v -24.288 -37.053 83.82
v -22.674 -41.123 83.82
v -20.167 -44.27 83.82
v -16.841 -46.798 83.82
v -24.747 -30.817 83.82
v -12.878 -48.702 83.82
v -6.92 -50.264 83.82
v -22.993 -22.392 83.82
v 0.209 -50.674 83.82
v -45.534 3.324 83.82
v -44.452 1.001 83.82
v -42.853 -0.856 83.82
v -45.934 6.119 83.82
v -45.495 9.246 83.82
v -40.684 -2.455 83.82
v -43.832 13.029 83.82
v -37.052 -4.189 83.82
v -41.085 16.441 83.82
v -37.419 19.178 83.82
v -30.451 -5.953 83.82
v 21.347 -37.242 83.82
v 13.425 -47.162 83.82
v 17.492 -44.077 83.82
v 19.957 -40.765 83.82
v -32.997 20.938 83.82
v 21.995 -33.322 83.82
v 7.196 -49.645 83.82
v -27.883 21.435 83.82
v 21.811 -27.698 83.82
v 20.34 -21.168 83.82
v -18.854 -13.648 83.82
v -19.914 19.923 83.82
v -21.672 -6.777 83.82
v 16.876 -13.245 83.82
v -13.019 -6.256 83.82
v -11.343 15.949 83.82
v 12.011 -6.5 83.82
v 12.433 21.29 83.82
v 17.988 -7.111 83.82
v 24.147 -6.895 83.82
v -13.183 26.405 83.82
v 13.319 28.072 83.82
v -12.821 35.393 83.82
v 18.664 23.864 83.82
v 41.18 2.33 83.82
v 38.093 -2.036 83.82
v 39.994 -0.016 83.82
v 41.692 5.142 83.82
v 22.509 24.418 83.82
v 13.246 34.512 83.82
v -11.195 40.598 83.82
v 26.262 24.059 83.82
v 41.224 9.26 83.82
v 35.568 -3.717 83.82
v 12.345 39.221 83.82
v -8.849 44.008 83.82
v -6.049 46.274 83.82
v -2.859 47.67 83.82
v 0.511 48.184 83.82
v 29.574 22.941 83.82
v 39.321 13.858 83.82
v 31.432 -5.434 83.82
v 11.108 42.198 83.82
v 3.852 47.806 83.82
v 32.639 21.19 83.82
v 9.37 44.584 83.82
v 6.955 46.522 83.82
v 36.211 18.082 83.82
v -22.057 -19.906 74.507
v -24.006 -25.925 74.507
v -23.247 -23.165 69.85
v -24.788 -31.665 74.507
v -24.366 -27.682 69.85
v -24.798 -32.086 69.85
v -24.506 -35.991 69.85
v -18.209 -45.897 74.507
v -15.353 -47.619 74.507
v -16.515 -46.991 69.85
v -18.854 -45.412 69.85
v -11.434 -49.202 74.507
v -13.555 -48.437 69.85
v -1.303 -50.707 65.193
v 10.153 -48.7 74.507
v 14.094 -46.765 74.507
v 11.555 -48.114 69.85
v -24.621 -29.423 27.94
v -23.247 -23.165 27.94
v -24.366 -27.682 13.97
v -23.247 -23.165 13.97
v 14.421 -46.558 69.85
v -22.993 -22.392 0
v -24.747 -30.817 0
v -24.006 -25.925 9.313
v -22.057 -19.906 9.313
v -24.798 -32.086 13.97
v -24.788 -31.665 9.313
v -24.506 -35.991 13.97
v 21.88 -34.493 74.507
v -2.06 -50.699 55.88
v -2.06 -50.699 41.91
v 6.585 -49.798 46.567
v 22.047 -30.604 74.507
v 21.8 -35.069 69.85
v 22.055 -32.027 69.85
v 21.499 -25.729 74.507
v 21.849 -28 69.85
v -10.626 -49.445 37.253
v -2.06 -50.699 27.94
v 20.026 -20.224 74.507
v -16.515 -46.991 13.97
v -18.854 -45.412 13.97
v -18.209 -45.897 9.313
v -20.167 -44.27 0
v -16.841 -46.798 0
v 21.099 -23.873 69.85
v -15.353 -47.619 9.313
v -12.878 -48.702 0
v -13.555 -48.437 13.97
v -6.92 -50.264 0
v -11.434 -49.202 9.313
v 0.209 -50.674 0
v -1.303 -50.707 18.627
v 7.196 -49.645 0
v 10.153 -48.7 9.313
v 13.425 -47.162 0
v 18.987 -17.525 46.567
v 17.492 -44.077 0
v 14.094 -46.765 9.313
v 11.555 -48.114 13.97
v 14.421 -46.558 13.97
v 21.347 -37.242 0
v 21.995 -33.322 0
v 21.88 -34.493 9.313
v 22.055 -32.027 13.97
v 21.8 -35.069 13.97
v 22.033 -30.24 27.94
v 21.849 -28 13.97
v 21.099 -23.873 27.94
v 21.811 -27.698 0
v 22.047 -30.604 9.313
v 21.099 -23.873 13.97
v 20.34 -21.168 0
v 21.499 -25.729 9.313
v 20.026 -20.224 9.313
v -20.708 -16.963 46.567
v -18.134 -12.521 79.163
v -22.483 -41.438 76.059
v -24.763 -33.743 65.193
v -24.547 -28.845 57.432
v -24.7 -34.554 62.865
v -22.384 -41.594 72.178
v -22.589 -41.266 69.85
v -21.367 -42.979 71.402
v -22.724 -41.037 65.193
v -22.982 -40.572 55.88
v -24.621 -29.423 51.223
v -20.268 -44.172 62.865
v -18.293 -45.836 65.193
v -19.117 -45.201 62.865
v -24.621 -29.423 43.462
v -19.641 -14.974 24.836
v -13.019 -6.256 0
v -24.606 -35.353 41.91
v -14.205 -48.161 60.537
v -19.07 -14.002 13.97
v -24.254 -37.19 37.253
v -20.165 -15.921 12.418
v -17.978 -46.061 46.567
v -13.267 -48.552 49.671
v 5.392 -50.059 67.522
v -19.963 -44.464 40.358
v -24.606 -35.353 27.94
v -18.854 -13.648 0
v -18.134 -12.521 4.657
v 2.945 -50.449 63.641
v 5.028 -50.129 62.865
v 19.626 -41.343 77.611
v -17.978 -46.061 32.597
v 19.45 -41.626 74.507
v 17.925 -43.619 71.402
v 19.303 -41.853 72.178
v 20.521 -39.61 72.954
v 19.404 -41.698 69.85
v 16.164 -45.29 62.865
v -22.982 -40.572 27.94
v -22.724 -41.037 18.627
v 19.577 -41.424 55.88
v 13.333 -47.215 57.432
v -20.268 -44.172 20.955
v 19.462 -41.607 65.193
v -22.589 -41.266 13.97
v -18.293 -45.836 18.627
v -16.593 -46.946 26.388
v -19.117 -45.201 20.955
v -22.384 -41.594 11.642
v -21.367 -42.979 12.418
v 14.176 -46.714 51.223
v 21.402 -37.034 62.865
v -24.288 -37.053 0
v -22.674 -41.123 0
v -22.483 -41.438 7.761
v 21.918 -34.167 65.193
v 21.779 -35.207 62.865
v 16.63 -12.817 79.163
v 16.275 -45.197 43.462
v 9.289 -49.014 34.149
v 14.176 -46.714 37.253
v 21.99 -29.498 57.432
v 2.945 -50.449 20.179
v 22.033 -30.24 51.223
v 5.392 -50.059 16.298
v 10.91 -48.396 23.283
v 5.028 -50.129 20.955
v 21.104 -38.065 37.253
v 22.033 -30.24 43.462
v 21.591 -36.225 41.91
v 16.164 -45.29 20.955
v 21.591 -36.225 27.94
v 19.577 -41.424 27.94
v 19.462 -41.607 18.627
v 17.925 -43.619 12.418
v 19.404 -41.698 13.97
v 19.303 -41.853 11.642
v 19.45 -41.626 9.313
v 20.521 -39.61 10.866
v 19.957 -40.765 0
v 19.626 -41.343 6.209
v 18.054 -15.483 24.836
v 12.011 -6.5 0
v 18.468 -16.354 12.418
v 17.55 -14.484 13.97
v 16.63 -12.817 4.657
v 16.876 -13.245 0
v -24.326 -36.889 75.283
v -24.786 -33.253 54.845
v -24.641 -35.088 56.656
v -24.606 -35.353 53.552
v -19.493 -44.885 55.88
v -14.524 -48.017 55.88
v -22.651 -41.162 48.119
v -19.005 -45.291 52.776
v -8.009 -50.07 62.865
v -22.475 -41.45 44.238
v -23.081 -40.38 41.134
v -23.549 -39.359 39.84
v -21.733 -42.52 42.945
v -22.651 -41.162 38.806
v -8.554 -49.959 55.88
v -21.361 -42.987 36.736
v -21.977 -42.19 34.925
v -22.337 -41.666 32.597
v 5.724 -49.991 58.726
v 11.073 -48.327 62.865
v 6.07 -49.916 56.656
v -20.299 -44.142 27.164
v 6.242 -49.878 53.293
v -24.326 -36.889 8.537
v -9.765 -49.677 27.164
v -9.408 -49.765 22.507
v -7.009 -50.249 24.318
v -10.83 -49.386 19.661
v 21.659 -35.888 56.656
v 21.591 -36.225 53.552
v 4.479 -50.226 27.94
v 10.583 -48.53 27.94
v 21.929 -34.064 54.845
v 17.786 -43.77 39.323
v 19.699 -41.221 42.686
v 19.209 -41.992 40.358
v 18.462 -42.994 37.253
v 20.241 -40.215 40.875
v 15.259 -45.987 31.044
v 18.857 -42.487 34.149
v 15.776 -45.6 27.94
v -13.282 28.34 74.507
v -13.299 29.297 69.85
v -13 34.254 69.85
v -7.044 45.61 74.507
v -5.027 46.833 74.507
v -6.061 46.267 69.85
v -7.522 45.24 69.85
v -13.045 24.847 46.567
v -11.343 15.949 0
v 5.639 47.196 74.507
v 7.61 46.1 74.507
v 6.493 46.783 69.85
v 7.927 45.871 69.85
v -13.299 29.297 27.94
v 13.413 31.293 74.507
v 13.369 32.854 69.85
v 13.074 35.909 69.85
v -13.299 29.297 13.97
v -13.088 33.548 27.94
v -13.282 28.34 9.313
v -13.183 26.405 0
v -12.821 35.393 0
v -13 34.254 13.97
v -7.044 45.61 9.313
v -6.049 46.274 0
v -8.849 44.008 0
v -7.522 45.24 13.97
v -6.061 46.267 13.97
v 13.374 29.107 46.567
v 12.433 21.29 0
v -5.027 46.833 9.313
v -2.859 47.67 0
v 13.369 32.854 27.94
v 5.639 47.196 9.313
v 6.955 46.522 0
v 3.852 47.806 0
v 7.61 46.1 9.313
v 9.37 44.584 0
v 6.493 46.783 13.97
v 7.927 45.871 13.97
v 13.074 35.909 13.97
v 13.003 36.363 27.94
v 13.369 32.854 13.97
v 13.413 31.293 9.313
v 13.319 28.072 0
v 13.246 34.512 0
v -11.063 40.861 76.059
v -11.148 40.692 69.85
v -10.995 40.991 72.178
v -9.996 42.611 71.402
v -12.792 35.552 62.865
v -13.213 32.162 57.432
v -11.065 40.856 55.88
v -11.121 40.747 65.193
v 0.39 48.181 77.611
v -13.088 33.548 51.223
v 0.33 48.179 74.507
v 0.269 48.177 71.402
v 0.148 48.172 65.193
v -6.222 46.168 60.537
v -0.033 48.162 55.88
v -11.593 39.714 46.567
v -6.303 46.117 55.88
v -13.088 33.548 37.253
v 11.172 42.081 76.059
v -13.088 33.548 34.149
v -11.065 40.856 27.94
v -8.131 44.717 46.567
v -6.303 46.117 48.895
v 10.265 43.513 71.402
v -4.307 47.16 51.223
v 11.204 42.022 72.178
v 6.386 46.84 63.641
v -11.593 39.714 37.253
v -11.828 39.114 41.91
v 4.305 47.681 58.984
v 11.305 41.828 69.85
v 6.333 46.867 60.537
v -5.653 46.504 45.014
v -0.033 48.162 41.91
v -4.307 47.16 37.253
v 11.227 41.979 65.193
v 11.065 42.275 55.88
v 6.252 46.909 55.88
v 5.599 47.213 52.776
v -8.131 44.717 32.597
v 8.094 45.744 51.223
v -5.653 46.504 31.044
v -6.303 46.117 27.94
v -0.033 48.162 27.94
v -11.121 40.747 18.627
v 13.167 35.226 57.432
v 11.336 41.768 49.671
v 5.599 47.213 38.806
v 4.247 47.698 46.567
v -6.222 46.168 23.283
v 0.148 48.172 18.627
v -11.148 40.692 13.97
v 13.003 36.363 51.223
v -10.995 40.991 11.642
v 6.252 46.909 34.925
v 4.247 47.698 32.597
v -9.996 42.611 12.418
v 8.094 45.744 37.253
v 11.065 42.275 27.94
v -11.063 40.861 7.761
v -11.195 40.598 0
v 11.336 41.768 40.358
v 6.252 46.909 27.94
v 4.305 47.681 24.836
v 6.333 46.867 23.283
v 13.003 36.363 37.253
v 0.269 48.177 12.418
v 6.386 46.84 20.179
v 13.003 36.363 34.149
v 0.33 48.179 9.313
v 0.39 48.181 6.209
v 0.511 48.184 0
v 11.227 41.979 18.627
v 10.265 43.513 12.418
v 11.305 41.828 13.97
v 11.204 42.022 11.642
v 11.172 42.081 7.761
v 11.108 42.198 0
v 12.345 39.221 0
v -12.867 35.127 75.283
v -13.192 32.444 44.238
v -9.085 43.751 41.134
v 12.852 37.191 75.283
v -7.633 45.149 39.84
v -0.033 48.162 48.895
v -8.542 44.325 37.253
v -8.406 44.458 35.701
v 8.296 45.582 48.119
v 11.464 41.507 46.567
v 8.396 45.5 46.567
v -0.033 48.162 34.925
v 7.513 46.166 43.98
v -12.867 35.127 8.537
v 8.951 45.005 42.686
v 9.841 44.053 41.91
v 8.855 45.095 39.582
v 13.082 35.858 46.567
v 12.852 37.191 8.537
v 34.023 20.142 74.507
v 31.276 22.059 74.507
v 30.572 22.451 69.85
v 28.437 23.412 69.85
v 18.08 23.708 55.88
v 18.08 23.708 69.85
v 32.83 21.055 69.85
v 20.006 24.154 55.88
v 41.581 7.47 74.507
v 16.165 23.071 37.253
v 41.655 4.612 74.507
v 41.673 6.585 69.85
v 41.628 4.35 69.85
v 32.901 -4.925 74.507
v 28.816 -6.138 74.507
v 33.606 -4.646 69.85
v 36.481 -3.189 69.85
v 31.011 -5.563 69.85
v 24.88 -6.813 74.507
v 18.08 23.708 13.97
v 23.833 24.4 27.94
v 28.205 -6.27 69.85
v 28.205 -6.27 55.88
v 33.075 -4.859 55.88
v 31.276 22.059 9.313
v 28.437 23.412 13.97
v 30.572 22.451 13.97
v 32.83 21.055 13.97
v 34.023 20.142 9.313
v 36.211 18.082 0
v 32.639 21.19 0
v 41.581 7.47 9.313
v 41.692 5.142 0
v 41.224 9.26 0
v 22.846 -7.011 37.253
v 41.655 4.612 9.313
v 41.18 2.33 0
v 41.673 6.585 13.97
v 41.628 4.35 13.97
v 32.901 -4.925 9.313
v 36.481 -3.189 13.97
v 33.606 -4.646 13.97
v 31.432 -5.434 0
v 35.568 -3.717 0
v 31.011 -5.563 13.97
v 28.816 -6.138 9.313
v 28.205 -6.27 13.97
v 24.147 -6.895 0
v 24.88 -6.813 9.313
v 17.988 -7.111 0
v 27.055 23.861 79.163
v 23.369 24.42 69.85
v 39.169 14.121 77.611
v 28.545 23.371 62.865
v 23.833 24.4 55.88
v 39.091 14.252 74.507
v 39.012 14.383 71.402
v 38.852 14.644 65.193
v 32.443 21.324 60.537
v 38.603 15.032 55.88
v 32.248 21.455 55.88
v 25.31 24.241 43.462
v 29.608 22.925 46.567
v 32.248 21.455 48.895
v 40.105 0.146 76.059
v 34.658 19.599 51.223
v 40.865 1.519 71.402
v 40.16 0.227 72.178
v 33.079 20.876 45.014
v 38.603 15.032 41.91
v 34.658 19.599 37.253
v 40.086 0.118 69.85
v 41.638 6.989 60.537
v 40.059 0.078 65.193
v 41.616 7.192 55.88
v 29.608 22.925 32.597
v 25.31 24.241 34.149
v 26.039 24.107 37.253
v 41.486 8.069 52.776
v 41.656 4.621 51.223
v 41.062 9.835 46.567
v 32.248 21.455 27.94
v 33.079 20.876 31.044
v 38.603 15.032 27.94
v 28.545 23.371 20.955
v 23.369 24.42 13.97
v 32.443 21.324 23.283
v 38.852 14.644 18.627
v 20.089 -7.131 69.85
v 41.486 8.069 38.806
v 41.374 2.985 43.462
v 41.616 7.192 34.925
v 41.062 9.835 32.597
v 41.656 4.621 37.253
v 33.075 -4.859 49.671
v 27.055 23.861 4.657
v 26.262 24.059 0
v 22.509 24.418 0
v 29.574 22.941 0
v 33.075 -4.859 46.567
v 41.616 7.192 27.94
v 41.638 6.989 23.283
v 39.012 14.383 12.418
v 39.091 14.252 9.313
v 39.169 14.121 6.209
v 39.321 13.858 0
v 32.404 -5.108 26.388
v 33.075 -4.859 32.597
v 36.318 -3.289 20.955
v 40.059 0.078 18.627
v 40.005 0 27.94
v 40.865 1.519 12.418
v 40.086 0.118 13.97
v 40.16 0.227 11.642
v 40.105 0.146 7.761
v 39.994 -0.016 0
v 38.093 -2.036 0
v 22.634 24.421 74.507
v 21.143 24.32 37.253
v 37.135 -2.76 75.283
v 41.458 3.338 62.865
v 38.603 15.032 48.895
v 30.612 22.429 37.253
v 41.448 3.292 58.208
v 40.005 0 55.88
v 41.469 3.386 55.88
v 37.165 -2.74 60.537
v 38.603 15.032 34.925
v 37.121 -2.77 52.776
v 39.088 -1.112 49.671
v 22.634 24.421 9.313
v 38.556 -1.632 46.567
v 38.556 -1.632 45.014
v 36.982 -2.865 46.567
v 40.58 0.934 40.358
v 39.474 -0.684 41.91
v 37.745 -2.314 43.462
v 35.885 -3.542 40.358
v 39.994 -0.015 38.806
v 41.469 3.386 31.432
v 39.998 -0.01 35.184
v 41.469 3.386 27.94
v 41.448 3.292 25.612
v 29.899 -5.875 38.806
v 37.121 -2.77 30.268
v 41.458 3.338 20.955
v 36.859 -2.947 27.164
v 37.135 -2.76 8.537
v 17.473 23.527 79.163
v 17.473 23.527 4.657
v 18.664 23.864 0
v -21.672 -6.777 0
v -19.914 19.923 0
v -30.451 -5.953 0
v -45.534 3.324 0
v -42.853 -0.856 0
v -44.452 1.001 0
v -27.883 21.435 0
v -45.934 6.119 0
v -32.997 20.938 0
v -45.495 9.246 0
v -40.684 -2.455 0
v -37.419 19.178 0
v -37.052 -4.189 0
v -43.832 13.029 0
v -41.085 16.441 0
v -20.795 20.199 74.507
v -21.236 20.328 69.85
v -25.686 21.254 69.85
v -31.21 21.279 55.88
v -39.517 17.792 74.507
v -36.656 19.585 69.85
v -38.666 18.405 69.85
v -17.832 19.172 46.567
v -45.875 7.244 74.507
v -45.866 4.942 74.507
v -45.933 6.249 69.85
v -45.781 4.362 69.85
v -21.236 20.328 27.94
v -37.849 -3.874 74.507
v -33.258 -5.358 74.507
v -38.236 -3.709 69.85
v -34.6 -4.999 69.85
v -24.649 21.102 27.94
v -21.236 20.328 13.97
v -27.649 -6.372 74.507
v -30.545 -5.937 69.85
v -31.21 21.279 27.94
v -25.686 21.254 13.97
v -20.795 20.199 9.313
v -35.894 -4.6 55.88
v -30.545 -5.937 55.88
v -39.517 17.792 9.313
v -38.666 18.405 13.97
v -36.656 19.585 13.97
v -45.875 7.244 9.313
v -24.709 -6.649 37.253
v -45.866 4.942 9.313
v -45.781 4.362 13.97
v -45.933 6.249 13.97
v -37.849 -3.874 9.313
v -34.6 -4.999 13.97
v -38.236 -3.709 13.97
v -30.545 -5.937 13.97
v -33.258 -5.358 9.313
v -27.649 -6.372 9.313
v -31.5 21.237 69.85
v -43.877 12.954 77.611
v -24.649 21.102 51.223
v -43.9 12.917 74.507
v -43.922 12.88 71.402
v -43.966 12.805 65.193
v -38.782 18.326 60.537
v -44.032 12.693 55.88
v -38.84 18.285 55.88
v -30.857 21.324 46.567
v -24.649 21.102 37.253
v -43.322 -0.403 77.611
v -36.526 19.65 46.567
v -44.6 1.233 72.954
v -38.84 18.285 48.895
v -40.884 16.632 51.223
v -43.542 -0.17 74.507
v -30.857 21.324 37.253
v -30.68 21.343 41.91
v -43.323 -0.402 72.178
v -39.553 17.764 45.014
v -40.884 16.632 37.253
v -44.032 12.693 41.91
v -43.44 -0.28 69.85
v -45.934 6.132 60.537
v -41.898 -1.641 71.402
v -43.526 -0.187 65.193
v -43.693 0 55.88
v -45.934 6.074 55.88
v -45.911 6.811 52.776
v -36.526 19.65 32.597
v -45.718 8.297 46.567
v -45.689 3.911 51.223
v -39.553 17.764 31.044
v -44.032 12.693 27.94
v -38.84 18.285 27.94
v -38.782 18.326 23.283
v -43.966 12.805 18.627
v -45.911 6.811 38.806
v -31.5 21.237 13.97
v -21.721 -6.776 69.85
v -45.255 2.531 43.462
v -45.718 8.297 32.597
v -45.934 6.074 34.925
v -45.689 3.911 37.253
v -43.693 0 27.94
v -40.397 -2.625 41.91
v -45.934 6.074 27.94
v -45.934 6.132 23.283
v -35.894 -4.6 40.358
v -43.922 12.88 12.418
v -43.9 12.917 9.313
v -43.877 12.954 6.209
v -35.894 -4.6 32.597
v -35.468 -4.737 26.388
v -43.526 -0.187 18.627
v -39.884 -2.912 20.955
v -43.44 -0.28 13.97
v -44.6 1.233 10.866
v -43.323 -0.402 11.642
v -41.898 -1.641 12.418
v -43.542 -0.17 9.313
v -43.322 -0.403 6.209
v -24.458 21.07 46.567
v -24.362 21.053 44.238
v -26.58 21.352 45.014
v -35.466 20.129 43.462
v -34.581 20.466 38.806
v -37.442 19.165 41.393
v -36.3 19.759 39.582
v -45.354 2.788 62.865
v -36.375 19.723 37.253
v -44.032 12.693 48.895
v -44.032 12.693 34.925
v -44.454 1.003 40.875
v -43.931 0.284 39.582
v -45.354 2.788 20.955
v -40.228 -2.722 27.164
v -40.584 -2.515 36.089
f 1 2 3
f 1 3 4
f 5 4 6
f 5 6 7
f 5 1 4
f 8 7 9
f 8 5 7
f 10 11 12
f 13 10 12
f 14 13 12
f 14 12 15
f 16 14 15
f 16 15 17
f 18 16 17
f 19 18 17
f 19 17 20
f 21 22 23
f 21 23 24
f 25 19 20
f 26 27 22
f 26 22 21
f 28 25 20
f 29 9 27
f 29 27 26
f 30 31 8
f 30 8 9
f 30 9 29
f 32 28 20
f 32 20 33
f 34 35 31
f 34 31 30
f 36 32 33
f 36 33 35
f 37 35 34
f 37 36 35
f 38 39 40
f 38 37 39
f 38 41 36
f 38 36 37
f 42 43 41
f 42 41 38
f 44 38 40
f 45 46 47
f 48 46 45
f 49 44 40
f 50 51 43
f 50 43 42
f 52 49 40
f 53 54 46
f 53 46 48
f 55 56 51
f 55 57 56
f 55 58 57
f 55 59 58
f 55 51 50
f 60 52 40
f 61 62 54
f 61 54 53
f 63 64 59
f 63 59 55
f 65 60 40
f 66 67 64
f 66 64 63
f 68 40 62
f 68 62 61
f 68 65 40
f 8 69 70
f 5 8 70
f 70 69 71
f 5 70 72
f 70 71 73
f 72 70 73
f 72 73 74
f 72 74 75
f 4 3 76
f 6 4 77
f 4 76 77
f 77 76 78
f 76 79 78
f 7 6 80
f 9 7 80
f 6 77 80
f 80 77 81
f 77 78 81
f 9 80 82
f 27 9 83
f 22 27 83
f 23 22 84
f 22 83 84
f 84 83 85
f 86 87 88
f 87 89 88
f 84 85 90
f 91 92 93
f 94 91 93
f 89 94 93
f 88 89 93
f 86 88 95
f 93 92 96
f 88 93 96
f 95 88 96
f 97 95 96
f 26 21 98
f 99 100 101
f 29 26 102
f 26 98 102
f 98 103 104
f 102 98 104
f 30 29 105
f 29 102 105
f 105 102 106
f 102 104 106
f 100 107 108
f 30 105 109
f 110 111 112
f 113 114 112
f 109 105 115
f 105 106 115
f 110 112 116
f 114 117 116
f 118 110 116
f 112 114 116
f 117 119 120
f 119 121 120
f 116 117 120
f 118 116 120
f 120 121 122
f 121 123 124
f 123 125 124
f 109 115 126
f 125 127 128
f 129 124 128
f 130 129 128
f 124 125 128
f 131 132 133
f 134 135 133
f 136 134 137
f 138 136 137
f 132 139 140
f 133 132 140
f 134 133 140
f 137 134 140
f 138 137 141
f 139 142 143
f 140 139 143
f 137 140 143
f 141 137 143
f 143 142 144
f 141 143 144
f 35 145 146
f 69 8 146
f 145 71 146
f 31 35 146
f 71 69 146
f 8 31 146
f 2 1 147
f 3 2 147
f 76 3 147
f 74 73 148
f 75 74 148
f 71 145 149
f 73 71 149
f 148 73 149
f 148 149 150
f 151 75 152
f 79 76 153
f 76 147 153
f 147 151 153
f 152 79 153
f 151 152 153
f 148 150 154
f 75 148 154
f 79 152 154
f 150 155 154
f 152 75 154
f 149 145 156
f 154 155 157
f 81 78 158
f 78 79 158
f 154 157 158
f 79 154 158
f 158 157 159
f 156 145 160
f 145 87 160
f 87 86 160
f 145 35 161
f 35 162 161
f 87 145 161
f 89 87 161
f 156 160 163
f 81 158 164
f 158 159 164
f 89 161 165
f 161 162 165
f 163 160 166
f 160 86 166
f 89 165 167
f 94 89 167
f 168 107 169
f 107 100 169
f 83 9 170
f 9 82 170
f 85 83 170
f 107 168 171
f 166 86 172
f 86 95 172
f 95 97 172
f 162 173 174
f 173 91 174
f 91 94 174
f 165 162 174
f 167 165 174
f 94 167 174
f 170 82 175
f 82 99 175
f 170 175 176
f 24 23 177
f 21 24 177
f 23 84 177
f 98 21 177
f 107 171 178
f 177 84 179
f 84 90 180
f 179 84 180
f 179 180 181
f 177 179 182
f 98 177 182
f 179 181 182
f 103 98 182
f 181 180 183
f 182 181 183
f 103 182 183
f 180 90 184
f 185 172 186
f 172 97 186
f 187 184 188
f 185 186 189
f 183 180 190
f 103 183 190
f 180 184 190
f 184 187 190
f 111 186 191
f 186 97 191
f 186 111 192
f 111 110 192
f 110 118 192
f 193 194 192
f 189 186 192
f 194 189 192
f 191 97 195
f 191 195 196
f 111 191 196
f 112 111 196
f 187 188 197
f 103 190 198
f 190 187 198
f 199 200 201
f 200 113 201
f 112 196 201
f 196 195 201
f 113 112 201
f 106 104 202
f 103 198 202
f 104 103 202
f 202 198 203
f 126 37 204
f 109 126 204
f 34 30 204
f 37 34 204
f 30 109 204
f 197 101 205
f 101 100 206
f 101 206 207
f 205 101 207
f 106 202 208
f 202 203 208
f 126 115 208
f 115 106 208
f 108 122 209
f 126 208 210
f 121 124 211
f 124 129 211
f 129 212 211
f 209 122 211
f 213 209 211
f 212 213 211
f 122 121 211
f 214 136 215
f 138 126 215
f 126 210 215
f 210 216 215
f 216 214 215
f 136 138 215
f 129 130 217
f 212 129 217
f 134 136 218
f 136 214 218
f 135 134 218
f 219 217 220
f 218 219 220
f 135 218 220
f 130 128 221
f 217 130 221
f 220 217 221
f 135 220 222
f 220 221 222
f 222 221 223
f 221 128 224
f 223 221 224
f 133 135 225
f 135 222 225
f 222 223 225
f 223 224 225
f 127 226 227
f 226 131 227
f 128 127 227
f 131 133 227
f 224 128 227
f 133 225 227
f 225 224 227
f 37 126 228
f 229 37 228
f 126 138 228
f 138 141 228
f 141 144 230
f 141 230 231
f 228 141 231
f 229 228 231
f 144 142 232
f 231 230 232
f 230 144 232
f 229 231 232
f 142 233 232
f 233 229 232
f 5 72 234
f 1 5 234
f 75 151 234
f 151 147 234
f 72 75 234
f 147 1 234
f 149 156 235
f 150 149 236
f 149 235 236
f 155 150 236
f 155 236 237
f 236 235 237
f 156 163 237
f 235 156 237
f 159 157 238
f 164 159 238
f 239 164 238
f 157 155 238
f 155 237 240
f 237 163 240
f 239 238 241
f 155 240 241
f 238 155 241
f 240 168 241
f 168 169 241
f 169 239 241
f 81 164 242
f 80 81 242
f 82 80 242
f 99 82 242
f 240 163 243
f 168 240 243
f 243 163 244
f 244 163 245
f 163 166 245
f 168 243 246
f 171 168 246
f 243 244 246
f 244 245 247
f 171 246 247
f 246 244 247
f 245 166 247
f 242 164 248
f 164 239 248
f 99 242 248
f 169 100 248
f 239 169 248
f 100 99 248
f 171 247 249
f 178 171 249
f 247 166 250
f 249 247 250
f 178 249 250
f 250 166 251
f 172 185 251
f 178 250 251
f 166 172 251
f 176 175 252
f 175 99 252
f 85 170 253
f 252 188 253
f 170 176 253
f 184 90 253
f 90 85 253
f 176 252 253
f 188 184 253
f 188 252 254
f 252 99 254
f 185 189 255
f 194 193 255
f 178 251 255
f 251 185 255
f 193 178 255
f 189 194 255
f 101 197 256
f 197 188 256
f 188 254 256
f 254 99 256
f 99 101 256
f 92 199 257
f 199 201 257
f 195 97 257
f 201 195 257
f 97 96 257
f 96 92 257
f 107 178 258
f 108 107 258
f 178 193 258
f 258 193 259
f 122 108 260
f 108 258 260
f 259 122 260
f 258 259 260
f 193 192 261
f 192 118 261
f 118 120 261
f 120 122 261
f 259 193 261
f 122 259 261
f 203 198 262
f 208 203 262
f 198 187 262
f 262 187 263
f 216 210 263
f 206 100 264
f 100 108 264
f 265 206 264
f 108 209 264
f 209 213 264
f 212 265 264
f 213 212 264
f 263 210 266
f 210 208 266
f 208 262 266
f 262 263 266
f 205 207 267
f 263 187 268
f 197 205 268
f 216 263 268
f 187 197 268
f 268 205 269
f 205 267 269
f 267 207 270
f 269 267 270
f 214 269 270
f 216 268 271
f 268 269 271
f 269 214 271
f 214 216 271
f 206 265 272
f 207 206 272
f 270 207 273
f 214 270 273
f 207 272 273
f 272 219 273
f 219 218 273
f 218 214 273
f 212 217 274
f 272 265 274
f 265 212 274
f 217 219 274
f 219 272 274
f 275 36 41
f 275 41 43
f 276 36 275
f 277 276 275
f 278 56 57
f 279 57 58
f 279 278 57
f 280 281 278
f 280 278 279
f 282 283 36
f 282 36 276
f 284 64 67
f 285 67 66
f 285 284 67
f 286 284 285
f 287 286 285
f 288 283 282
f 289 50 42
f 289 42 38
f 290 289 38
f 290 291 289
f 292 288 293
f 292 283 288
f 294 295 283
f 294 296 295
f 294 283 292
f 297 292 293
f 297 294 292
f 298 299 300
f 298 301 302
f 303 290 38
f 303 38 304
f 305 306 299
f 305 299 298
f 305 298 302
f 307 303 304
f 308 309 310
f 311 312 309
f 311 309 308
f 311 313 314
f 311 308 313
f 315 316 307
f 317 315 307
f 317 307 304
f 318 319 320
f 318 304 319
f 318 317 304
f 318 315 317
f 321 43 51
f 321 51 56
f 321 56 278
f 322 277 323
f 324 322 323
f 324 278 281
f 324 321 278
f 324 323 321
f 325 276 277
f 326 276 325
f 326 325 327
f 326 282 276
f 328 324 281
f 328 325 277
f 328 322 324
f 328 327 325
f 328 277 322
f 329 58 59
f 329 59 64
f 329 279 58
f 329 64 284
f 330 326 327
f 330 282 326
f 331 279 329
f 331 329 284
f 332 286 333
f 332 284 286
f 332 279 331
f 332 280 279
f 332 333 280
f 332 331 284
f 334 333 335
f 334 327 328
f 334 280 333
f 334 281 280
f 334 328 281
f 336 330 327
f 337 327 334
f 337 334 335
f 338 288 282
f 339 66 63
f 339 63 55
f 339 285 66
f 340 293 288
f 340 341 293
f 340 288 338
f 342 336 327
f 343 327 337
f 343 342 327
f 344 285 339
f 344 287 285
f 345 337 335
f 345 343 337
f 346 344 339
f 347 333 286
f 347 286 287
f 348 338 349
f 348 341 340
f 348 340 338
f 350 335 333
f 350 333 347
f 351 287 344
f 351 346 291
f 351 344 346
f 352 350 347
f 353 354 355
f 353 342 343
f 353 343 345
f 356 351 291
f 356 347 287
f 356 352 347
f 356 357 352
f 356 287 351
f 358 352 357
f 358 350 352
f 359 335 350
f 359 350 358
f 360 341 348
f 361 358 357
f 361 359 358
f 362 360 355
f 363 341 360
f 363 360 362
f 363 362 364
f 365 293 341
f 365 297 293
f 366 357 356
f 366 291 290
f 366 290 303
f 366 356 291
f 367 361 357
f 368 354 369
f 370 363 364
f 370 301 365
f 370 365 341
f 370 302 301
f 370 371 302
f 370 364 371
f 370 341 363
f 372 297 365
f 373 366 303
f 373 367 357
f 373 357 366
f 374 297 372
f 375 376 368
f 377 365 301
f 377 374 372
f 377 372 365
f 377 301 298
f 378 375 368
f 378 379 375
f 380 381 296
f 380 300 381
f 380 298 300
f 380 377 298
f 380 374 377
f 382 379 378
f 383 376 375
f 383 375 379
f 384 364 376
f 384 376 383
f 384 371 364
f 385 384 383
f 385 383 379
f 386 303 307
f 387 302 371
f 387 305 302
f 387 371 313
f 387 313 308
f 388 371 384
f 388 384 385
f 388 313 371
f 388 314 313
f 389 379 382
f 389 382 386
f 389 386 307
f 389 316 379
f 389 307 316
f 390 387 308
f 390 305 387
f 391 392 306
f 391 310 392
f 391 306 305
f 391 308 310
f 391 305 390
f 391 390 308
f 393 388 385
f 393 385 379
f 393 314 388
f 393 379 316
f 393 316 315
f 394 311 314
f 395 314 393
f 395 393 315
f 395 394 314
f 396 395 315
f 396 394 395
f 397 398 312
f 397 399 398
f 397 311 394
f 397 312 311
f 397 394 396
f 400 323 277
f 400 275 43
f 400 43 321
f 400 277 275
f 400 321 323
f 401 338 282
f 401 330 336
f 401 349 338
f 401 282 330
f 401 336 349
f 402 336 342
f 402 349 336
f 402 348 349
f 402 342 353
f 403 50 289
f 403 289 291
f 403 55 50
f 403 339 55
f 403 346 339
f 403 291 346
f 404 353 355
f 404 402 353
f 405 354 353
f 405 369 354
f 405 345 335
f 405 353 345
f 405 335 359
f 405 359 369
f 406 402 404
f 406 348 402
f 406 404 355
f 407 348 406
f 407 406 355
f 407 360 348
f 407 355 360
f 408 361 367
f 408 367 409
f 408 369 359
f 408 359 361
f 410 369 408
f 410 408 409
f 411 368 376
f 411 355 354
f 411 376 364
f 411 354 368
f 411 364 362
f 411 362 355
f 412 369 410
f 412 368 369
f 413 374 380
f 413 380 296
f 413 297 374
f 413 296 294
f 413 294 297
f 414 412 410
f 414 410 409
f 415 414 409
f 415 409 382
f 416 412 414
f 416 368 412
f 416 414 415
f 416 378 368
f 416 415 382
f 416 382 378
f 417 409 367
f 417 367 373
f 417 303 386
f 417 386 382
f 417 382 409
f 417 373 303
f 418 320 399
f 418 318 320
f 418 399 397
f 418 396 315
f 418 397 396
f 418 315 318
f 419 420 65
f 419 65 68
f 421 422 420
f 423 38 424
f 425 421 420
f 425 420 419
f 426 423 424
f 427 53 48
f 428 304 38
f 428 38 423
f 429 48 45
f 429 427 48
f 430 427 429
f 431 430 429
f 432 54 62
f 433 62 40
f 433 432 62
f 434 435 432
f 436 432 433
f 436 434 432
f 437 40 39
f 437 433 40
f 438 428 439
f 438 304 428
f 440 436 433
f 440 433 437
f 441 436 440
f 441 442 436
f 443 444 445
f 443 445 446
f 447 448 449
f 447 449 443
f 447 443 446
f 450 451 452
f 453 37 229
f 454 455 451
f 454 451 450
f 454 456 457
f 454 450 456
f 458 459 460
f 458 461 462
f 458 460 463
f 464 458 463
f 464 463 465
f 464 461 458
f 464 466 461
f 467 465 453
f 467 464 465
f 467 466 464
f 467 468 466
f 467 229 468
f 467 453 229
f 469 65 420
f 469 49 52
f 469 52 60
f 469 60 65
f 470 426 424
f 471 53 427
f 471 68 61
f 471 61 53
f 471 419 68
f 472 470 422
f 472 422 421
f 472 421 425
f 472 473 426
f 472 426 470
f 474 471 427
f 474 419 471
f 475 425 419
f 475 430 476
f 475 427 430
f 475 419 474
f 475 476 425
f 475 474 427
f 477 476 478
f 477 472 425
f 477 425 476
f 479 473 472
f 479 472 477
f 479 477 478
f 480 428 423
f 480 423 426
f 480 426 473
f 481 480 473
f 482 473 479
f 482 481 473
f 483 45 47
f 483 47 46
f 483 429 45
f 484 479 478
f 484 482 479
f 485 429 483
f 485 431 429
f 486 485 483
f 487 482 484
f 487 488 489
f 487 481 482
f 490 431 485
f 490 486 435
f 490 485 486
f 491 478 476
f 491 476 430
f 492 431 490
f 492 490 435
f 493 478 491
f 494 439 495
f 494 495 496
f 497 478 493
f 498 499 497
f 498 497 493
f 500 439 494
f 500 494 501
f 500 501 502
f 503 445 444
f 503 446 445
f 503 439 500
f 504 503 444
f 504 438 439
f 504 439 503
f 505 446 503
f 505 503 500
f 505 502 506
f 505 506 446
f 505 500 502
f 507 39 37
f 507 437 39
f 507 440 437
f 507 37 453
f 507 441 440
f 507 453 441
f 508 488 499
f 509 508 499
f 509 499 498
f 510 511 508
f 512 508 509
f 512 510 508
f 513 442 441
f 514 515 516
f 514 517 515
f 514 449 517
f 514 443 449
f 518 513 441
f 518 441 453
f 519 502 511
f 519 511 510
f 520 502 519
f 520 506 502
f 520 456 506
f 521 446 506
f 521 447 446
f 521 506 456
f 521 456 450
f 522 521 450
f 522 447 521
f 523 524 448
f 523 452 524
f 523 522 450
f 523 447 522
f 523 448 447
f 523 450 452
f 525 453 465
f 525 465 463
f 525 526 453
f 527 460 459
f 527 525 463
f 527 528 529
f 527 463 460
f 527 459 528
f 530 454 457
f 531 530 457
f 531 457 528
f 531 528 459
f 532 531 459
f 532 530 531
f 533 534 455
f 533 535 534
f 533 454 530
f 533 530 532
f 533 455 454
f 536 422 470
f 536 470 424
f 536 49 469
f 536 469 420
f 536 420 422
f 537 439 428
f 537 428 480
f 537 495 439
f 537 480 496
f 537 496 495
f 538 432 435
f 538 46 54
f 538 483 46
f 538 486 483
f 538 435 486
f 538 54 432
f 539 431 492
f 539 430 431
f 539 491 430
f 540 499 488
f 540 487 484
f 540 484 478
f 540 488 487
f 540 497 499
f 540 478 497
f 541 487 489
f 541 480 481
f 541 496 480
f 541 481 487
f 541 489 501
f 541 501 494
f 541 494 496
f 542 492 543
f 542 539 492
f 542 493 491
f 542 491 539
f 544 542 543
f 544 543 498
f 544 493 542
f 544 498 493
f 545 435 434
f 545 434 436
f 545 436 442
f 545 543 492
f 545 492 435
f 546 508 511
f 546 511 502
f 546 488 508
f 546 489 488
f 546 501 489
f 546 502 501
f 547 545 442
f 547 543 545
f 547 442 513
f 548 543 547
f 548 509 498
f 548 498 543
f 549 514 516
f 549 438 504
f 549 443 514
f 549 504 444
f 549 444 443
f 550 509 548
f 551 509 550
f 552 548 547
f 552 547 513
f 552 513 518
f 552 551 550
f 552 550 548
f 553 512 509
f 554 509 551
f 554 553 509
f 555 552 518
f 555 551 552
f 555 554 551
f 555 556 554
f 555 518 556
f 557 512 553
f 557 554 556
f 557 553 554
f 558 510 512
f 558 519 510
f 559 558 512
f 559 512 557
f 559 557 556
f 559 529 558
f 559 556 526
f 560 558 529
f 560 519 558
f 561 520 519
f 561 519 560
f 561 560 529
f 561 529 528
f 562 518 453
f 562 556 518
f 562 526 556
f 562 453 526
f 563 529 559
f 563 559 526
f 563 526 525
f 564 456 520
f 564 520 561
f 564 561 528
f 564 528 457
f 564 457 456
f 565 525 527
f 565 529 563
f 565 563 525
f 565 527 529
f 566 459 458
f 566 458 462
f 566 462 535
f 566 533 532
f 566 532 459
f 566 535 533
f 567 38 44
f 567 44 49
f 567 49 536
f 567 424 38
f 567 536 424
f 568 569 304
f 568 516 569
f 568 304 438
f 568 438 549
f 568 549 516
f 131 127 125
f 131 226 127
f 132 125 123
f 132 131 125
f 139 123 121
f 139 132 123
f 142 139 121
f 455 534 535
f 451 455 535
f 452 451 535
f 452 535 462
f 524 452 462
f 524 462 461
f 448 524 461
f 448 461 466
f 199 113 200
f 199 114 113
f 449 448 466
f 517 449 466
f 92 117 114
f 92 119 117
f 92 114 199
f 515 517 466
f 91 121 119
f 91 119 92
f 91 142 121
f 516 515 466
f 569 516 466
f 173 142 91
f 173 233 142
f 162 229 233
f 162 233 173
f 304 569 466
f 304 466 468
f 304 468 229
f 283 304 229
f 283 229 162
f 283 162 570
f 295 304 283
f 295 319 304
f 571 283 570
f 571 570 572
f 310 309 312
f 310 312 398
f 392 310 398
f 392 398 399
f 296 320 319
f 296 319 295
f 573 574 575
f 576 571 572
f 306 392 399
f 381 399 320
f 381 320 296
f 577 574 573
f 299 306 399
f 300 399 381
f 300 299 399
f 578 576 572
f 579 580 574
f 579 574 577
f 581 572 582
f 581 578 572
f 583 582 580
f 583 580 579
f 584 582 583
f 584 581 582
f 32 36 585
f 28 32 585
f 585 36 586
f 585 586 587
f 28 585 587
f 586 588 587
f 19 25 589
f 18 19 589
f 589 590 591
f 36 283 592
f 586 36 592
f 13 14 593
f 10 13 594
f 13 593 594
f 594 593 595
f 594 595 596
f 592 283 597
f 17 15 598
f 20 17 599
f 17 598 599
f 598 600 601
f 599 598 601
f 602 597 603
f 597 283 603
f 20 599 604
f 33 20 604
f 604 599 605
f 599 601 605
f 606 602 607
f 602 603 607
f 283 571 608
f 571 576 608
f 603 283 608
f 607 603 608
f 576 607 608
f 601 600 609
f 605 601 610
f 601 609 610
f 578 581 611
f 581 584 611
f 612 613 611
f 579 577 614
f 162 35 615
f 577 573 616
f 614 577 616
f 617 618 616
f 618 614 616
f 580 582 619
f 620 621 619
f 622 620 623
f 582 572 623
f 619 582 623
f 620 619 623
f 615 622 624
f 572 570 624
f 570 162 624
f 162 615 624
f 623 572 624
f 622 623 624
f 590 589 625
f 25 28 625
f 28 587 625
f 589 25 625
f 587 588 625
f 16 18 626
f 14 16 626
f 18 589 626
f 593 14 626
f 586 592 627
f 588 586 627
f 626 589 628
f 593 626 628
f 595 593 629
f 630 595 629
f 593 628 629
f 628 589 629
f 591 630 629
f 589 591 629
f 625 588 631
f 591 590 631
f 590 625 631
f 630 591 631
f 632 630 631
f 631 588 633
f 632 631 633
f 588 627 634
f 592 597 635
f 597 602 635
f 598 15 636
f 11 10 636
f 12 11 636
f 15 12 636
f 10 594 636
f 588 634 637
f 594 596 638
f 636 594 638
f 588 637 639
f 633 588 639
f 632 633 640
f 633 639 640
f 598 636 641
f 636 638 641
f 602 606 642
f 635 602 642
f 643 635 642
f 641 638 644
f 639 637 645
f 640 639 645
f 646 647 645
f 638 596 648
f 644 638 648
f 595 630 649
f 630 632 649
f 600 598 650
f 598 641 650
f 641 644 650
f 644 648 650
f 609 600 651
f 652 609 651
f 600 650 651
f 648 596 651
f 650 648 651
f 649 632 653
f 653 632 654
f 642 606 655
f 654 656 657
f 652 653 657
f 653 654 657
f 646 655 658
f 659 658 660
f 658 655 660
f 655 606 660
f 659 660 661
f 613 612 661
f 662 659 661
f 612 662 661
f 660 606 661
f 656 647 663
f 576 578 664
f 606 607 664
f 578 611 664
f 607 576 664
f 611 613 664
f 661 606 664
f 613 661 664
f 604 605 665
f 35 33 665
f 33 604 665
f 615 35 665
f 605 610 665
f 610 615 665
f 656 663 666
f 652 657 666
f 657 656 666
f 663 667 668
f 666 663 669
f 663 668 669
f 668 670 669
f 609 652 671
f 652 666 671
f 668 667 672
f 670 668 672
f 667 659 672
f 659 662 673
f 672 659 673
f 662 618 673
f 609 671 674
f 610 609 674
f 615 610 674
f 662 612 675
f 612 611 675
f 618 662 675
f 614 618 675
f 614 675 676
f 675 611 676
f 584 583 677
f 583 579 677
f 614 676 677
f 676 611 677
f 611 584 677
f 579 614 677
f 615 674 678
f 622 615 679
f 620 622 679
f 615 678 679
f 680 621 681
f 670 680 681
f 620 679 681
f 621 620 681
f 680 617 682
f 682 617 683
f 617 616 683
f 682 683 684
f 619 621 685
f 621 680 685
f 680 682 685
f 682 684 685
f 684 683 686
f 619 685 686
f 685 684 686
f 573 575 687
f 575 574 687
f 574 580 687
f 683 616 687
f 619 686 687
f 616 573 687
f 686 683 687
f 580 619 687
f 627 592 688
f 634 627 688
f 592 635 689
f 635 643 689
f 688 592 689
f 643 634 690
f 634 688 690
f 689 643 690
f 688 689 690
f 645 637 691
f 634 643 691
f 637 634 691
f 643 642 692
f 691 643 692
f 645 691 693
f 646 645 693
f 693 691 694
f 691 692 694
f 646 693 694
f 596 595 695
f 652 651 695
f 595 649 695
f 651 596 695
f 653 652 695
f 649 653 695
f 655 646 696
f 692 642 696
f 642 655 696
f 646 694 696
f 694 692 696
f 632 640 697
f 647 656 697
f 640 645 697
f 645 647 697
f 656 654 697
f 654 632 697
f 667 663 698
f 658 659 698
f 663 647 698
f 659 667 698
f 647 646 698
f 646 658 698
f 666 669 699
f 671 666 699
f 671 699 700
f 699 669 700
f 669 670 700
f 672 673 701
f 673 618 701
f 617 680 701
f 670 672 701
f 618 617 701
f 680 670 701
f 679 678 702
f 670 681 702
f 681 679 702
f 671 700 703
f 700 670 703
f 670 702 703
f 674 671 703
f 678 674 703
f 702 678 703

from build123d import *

# Parameters (mm, degrees)
F1_DEPTH = 83.82
F3_DEPTH = 83.82
F5_DEPTH = 83.82
F7_DEPTH = 83.82


with BuildPart() as f1:
    # F0 (on Top) → F1 (new body)
    with BuildSketch(Plane.XY):
        with BuildLine():
            add(Edge.make_bspline(
                [(0, 0), (-4.542251788, 8.6722579806), (25.117162513, 40.4067182608), (57.4362688361, -9.8415354303), (4.9192483223, -9.3920356053), (0, 0)],
                knots=[0, 0, 0, 0, 0.3322910196, 0.640129584, 1, 1, 1, 1], degree=3))
        make_face()
    extrude(amount=F1_DEPTH)

    # F2 (on Top) → F3 (join)
    with BuildSketch(Plane.XY):
        with BuildLine():
            add(Edge.make_bspline(
                [(0, 0), (3.5360873129, 8.1108450651), (-33.7354607969, 35.4127978008), (-59.3875210851, -9.8435318092), (-3.8030915501, -8.7232818657), (0, 0)],
                knots=[0, 0, 0, 0, 0.3467803128, 0.6270348663, 1, 1, 1, 1], degree=3))
        make_face()
    extrude(amount=F3_DEPTH)

    # F4 (on Top) → F5 (join)
    with BuildSketch(Plane.XY):
        with BuildLine():
            add(Edge.make_bspline(
                [(0, 0), (-8.7551870735, -0.2972169463), (-23.8915766626, 48.9198558265), (24.0835572587, 51.8182670564), (8.8958321097, 0.3019914974), (0, 0)],
                knots=[0, 0, 0, 0, 0.3649799766, 0.6291569137, 1, 1, 1, 1], degree=3))
        make_face()
    extrude(amount=F5_DEPTH)

    # F6 (on Top) → F7 (join)
    with BuildSketch(Plane.XY):
        with BuildLine():
            add(Edge.make_bspline(
                [(0, 0), (-14.5424313234, 0.4322577323), (-45.1730729091, -53.0143331062), (40.5602157338, -54.8459450659), (14.4151869246, -0.4284755329), (0, 0)],
                knots=[0, 0, 0, 0, 0.3393626771, 0.6636067025, 1, 1, 1, 1], degree=3))
        make_face()
    extrude(amount=F7_DEPTH)


solid = f1.part
